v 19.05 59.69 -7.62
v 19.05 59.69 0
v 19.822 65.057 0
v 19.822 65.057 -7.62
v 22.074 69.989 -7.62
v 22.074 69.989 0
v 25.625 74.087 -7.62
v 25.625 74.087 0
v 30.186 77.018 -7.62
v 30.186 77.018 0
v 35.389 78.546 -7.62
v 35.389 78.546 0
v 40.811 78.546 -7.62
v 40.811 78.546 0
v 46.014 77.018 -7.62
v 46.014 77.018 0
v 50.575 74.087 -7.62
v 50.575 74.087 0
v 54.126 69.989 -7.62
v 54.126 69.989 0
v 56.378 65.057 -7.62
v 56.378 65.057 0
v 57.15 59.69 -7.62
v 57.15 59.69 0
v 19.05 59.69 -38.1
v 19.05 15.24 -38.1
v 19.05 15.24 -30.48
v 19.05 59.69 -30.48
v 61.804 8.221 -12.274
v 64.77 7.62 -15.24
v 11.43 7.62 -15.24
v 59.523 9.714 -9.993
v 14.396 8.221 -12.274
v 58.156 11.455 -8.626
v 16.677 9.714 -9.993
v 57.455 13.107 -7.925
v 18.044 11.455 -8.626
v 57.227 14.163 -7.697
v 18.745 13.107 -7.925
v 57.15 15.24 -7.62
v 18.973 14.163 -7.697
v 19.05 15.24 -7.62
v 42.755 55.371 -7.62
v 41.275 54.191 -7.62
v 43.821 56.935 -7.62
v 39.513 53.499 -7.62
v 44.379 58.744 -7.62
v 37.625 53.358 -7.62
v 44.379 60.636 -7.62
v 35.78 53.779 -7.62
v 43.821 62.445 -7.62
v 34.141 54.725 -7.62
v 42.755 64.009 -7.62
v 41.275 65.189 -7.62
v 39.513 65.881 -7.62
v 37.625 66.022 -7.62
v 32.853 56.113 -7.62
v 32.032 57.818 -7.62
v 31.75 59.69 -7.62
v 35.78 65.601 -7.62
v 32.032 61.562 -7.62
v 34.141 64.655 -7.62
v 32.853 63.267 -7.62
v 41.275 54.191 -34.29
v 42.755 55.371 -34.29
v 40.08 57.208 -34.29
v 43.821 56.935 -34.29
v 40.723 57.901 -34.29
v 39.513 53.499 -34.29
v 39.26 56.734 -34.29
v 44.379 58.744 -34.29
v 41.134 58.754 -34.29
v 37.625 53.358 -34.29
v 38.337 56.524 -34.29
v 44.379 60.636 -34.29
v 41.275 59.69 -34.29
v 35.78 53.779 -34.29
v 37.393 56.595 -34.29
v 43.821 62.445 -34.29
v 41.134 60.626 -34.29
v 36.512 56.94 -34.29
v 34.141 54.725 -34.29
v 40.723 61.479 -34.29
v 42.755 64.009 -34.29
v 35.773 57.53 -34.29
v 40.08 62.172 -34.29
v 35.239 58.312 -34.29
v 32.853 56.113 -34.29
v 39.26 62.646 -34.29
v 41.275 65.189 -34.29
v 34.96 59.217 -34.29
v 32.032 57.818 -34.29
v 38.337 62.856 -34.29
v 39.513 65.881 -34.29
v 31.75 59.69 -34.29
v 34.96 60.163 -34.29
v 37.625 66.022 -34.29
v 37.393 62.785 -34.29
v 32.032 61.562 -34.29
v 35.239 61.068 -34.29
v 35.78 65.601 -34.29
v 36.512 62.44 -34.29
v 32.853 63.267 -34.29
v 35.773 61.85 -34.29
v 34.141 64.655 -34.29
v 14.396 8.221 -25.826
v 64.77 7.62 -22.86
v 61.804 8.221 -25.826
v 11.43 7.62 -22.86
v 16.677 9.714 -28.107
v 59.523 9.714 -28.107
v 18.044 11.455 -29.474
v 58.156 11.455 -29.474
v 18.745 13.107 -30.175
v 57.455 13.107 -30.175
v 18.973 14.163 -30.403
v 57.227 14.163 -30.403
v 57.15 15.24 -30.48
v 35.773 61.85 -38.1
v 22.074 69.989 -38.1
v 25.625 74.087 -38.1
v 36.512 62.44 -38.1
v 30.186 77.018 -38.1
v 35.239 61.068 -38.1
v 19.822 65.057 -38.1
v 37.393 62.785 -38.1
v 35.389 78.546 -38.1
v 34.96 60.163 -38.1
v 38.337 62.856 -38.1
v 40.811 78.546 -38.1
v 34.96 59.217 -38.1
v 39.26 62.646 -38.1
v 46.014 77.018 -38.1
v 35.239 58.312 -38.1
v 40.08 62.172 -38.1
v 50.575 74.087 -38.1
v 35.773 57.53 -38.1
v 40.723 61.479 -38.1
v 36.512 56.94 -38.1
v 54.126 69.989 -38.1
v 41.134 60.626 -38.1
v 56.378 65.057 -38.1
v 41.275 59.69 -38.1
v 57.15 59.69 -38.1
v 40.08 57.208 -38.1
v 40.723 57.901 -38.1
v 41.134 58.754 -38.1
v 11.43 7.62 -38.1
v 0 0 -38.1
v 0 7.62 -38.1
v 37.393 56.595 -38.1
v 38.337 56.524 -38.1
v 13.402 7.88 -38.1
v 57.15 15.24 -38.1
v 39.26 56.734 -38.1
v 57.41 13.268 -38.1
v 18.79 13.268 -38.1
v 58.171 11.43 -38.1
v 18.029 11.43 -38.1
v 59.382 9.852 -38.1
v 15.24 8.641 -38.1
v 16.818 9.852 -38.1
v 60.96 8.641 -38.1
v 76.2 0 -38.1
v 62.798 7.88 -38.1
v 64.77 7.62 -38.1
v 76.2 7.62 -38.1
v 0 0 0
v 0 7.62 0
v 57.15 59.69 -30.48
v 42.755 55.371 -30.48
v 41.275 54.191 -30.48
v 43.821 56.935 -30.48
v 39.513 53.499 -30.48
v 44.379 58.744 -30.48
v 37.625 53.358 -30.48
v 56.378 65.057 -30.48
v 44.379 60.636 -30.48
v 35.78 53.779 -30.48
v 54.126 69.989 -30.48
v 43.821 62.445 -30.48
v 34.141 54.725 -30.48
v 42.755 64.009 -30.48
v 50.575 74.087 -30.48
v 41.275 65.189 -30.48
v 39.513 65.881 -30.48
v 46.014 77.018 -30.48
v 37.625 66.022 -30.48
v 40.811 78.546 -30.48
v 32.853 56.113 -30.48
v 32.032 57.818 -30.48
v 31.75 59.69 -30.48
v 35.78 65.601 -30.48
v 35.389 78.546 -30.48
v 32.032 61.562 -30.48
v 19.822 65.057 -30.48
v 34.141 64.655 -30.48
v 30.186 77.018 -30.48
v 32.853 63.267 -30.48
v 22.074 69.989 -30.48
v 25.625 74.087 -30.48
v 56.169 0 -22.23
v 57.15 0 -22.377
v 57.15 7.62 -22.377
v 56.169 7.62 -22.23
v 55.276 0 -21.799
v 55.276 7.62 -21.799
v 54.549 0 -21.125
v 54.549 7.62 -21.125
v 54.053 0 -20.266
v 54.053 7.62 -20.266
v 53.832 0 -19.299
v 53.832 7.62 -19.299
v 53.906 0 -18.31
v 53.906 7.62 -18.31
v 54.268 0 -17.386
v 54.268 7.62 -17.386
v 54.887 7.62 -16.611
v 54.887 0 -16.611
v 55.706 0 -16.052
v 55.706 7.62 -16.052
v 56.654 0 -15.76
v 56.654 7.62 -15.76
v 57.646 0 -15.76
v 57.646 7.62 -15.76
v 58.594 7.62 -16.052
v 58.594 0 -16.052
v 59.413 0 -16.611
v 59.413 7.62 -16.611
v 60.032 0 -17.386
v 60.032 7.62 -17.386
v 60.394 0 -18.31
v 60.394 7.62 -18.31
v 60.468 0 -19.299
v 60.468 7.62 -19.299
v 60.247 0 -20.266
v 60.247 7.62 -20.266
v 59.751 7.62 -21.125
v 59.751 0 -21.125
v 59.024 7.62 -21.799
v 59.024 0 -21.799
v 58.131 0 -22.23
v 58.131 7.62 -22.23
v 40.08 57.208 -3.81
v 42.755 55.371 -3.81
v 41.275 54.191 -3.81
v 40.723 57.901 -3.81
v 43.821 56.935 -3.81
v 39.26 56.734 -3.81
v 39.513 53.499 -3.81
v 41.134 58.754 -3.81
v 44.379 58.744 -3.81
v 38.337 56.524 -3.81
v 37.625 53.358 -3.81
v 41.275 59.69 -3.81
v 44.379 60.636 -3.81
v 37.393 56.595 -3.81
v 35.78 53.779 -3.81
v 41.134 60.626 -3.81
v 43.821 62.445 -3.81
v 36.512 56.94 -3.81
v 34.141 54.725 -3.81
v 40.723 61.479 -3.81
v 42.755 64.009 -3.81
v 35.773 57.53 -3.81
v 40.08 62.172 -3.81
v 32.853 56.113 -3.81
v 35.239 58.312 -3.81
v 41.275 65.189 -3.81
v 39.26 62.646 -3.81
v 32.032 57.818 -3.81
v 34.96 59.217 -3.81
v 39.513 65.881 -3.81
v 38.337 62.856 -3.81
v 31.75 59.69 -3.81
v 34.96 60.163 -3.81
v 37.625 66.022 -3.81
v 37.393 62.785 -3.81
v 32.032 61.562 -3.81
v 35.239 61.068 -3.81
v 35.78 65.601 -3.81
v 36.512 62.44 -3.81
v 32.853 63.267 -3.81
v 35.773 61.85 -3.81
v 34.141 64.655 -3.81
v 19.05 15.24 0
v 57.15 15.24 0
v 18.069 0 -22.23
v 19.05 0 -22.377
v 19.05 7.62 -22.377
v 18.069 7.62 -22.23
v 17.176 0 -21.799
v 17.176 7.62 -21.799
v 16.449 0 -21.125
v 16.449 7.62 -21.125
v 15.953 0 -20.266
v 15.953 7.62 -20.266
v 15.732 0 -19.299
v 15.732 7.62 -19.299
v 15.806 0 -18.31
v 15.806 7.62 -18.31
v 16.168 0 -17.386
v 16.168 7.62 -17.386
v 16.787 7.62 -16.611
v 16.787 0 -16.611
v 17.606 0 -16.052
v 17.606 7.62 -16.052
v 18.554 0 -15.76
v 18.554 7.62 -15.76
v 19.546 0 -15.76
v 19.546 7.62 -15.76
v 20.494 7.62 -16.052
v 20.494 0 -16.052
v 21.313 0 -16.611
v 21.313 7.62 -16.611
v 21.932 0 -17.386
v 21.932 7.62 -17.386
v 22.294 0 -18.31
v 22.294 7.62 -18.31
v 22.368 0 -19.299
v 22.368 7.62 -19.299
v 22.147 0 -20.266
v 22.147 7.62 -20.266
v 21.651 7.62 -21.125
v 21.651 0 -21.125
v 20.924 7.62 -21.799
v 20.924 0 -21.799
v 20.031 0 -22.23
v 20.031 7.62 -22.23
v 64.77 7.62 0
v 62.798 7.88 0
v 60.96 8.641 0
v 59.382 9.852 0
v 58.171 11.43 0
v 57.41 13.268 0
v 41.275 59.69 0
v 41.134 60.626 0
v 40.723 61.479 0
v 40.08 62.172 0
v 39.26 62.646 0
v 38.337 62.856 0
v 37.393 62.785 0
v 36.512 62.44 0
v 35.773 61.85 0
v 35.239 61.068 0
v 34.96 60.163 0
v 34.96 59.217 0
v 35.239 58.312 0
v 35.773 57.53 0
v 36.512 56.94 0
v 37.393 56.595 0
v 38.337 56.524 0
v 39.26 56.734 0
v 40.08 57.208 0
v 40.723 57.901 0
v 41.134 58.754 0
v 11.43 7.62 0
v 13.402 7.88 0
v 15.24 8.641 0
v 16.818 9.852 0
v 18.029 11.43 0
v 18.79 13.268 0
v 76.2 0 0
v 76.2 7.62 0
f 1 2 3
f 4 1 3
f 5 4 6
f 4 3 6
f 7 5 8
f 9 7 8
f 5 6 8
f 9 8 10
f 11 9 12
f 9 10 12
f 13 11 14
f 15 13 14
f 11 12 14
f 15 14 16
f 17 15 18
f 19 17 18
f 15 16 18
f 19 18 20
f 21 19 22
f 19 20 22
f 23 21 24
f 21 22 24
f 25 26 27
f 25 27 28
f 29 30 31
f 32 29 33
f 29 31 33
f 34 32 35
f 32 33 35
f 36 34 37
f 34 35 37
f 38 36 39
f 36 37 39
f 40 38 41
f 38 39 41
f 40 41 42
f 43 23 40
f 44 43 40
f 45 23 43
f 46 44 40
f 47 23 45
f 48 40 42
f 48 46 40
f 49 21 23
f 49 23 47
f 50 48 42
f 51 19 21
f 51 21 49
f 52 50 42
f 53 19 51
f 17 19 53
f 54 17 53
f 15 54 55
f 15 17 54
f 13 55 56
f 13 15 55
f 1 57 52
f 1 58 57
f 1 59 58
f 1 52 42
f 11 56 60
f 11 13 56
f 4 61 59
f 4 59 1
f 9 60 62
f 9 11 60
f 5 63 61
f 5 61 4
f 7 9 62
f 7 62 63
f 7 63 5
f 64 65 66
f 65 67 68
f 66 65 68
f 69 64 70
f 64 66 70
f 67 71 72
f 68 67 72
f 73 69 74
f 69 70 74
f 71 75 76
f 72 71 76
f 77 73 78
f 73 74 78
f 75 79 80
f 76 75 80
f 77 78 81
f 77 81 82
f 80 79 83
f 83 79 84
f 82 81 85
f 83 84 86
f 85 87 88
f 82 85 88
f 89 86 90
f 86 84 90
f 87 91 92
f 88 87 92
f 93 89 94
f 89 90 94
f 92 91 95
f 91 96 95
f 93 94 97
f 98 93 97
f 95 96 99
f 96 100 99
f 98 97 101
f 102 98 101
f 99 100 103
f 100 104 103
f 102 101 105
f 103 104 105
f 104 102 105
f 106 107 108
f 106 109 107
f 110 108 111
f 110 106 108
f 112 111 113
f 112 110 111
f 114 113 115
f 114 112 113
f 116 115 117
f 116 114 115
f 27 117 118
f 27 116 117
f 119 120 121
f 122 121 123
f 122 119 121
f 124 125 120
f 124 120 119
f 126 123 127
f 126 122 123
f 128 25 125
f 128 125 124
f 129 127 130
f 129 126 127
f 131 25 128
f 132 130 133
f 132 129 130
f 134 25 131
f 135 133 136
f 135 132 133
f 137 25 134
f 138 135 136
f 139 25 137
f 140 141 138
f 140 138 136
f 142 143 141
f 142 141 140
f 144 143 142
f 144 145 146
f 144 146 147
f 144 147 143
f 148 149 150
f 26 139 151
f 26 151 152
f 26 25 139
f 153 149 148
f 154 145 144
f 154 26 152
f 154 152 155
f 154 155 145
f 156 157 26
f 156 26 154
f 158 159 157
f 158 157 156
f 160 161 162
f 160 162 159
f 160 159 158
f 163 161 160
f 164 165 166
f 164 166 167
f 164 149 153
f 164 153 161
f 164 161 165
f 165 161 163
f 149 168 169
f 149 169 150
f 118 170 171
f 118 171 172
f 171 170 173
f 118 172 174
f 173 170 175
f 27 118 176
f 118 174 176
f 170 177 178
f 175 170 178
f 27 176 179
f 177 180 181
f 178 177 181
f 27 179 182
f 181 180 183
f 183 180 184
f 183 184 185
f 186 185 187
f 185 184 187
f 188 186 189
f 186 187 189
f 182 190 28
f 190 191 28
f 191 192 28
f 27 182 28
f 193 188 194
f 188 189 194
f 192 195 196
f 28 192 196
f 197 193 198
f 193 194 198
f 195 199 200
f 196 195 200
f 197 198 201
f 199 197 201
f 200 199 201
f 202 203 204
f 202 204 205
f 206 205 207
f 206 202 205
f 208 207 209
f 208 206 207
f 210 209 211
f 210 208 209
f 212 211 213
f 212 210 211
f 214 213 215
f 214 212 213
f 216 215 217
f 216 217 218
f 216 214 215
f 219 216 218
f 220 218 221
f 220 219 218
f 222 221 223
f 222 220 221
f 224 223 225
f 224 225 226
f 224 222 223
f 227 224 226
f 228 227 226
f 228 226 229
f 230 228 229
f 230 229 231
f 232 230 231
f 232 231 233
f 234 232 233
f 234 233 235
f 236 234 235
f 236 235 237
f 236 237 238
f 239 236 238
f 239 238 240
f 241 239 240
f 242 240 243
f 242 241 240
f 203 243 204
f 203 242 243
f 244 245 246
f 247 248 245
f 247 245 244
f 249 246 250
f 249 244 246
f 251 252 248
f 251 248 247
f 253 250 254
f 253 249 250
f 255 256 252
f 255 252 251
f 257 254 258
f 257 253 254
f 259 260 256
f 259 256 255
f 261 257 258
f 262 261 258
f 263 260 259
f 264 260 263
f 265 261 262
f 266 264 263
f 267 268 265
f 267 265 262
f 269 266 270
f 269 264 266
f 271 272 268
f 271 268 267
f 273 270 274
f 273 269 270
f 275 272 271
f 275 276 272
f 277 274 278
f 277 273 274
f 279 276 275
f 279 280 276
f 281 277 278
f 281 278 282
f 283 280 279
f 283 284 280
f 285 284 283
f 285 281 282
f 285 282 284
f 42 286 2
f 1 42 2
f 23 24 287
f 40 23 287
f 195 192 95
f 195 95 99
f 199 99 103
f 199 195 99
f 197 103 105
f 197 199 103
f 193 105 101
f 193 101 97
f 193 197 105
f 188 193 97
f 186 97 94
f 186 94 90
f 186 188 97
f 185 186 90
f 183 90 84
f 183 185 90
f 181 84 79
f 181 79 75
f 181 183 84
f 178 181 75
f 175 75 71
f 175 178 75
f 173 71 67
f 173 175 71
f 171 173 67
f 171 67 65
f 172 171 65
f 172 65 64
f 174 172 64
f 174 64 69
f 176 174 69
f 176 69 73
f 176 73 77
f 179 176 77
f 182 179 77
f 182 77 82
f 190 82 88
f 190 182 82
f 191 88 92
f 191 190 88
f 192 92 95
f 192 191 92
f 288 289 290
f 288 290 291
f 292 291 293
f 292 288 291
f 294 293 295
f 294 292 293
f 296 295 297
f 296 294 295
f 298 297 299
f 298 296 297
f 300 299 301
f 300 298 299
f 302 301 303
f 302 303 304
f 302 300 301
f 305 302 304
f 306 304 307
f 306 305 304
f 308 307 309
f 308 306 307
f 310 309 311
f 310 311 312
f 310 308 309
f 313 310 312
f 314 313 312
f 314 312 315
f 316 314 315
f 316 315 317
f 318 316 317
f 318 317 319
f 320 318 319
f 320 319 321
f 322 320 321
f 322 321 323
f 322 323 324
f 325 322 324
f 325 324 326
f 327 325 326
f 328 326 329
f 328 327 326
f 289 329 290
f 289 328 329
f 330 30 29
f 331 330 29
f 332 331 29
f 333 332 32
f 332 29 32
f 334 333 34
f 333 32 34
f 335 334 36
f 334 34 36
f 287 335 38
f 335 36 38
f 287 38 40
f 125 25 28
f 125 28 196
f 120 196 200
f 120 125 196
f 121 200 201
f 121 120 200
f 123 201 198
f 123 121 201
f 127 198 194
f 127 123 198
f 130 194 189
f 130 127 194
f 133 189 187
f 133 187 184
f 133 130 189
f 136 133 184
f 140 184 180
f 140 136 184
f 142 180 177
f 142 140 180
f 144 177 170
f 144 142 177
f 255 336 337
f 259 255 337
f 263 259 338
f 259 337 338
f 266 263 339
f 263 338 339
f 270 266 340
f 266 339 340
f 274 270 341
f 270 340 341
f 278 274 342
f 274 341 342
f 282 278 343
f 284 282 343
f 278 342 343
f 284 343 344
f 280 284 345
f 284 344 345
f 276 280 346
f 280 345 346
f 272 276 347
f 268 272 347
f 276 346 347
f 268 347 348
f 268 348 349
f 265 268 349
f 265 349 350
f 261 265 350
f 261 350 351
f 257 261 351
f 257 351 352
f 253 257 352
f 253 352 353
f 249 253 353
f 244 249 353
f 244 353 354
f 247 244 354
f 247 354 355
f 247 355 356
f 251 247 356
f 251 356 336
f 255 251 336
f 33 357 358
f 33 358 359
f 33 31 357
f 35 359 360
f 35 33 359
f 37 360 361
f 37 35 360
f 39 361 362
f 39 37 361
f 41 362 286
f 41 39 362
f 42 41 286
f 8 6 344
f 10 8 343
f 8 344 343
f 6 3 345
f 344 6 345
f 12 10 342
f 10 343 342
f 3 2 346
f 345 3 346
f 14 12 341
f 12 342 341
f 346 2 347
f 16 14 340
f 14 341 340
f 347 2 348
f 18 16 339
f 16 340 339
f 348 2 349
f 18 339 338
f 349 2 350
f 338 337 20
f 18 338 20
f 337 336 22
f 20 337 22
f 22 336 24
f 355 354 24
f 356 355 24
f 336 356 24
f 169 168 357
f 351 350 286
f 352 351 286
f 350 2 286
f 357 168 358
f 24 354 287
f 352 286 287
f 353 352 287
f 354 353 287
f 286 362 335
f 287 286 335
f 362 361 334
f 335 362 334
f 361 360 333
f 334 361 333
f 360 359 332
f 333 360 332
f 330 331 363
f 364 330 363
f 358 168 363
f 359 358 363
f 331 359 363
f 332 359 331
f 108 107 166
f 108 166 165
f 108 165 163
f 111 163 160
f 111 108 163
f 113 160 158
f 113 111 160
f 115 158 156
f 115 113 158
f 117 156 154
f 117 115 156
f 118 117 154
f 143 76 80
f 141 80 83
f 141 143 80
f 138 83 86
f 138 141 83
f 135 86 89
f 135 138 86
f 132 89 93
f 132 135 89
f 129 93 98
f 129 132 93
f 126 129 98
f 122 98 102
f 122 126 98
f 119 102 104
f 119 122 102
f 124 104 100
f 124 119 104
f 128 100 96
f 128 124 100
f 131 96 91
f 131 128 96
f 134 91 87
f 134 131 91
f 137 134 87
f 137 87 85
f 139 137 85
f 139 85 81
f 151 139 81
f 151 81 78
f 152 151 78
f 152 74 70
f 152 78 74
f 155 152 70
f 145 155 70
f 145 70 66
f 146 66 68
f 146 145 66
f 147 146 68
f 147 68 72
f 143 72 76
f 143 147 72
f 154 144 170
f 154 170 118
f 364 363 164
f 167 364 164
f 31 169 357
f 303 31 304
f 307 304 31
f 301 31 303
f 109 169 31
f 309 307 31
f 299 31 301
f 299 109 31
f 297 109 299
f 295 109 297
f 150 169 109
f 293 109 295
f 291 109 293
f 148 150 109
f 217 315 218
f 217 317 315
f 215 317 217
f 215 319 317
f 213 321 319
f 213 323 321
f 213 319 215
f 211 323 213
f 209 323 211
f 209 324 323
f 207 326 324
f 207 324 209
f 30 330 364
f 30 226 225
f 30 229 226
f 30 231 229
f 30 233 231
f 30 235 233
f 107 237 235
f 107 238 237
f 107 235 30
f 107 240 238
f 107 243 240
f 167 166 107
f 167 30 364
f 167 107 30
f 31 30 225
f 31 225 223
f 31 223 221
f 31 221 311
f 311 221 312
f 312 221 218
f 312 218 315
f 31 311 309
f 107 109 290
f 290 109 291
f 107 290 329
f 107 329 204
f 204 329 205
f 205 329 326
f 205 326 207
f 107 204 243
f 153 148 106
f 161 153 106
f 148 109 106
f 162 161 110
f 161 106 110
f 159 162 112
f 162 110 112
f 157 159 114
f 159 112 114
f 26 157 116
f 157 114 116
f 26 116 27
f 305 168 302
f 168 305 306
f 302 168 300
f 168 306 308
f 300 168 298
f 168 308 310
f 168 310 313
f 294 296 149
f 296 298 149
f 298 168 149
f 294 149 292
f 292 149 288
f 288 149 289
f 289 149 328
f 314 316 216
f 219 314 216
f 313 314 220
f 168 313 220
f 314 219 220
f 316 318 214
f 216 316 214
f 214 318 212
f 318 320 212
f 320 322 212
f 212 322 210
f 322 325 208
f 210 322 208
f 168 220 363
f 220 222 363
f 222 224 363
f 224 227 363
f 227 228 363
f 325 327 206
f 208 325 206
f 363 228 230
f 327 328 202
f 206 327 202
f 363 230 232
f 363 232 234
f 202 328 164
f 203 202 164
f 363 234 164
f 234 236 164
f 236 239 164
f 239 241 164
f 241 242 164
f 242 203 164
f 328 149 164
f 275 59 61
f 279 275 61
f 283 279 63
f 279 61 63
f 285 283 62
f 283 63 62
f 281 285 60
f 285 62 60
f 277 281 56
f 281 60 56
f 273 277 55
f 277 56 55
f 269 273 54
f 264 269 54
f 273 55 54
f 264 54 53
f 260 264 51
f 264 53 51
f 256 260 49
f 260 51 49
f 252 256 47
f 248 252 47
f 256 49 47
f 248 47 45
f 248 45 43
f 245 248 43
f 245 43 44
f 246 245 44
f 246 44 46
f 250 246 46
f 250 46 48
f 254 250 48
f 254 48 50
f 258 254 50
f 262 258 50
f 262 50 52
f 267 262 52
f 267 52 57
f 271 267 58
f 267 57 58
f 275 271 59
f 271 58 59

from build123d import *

# Parameters (mm, degrees)
SKETCH1_W            = 76.2
SKETCH1_H            = 38.1
SKETCH1_R            = 3.3274
BOSS_EXTRUDE1_DEPTH  = 7.62
SKETCH2_R            = 3.175
BOSS_EXTRUDE2_DEPTH  = 7.62
FILLET1_R            = 7.62
SKETCH3_R            = 6.35
CUT_EXTRUDE1_DEPTH   = 3.81
FILLET1_OF_MIRROR2_R = 7.62


with BuildPart() as part:
    # Sketch1 → Boss-Extrude1 (new body)
    with BuildSketch(Plane(origin=(0, 0, 0), x_dir=(1, 0, 0), z_dir=(0, 1, 0))):
        with Locations((38.1, 19.05)):
            Rectangle(SKETCH1_W, SKETCH1_H)
        with Locations(Location((19.05, 19.05, 0), (0, 0, 90))):
            Circle(SKETCH1_R, mode=Mode.SUBTRACT)
        with Locations(Location((57.15, 19.05, 0), (0, 0, 90))):
            Circle(SKETCH1_R, mode=Mode.SUBTRACT)
    extrude(amount=BOSS_EXTRUDE1_DEPTH)

    # Sketch2 → Boss-Extrude2 (add)
    with BuildSketch(Plane.XY):
        with BuildLine():
            Line((19.05, 7.62), (19.05, 59.69))
            ThreePointArc((19.05, 59.69), (38.1, 78.74), (57.15, 59.69))
            Line((57.15, 59.69), (57.15, 7.62))
            Line((57.15, 7.62), (19.05, 7.62))
        make_face()
        with Locations((38.1, 59.69)):
            Circle(SKETCH2_R, mode=Mode.SUBTRACT)
    boss_extrude2 = extrude(amount=-BOSS_EXTRUDE2_DEPTH)

    # Fillet1
    fillet1_edges = [part.edges().sort_by_distance(p)[0] for p in [
        (38.1, 7.62, -7.62),
        (57.15, 7.62, -3.81),
        (19.05, 7.62, -3.81),
    ]]
    fillet(fillet1_edges, radius=FILLET1_R)

    # Sketch3 → Cut-Extrude1 (cut)
    with BuildSketch(Plane(origin=(0, 0, -7.62), x_dir=(-1, 0, 0), z_dir=(0, 0, -1))):
        with Locations((-38.1, 59.69)):
            Circle(SKETCH3_R)
    cut_extrude1 = extrude(amount=-CUT_EXTRUDE1_DEPTH, mode=Mode.SUBTRACT)

    # Mirror2: Boss-Extrude2, Cut-Extrude1 across plane
    add(boss_extrude2.mirror(Plane.XY.offset(-19.05)))
    add(cut_extrude1.mirror(Plane.XY.offset(-19.05)), mode=Mode.SUBTRACT)

    # Fillet1 of Mirror2
    fillet1_of_mirror2_edges = [part.edges().sort_by_distance(p)[0] for p in [
        (38.1, 7.62, -30.48),
        (57.15, 7.62, -34.29),
        (19.05, 7.62, -34.29),
    ]]
    fillet(fillet1_of_mirror2_edges, radius=FILLET1_OF_MIRROR2_R)


solid = part.part
